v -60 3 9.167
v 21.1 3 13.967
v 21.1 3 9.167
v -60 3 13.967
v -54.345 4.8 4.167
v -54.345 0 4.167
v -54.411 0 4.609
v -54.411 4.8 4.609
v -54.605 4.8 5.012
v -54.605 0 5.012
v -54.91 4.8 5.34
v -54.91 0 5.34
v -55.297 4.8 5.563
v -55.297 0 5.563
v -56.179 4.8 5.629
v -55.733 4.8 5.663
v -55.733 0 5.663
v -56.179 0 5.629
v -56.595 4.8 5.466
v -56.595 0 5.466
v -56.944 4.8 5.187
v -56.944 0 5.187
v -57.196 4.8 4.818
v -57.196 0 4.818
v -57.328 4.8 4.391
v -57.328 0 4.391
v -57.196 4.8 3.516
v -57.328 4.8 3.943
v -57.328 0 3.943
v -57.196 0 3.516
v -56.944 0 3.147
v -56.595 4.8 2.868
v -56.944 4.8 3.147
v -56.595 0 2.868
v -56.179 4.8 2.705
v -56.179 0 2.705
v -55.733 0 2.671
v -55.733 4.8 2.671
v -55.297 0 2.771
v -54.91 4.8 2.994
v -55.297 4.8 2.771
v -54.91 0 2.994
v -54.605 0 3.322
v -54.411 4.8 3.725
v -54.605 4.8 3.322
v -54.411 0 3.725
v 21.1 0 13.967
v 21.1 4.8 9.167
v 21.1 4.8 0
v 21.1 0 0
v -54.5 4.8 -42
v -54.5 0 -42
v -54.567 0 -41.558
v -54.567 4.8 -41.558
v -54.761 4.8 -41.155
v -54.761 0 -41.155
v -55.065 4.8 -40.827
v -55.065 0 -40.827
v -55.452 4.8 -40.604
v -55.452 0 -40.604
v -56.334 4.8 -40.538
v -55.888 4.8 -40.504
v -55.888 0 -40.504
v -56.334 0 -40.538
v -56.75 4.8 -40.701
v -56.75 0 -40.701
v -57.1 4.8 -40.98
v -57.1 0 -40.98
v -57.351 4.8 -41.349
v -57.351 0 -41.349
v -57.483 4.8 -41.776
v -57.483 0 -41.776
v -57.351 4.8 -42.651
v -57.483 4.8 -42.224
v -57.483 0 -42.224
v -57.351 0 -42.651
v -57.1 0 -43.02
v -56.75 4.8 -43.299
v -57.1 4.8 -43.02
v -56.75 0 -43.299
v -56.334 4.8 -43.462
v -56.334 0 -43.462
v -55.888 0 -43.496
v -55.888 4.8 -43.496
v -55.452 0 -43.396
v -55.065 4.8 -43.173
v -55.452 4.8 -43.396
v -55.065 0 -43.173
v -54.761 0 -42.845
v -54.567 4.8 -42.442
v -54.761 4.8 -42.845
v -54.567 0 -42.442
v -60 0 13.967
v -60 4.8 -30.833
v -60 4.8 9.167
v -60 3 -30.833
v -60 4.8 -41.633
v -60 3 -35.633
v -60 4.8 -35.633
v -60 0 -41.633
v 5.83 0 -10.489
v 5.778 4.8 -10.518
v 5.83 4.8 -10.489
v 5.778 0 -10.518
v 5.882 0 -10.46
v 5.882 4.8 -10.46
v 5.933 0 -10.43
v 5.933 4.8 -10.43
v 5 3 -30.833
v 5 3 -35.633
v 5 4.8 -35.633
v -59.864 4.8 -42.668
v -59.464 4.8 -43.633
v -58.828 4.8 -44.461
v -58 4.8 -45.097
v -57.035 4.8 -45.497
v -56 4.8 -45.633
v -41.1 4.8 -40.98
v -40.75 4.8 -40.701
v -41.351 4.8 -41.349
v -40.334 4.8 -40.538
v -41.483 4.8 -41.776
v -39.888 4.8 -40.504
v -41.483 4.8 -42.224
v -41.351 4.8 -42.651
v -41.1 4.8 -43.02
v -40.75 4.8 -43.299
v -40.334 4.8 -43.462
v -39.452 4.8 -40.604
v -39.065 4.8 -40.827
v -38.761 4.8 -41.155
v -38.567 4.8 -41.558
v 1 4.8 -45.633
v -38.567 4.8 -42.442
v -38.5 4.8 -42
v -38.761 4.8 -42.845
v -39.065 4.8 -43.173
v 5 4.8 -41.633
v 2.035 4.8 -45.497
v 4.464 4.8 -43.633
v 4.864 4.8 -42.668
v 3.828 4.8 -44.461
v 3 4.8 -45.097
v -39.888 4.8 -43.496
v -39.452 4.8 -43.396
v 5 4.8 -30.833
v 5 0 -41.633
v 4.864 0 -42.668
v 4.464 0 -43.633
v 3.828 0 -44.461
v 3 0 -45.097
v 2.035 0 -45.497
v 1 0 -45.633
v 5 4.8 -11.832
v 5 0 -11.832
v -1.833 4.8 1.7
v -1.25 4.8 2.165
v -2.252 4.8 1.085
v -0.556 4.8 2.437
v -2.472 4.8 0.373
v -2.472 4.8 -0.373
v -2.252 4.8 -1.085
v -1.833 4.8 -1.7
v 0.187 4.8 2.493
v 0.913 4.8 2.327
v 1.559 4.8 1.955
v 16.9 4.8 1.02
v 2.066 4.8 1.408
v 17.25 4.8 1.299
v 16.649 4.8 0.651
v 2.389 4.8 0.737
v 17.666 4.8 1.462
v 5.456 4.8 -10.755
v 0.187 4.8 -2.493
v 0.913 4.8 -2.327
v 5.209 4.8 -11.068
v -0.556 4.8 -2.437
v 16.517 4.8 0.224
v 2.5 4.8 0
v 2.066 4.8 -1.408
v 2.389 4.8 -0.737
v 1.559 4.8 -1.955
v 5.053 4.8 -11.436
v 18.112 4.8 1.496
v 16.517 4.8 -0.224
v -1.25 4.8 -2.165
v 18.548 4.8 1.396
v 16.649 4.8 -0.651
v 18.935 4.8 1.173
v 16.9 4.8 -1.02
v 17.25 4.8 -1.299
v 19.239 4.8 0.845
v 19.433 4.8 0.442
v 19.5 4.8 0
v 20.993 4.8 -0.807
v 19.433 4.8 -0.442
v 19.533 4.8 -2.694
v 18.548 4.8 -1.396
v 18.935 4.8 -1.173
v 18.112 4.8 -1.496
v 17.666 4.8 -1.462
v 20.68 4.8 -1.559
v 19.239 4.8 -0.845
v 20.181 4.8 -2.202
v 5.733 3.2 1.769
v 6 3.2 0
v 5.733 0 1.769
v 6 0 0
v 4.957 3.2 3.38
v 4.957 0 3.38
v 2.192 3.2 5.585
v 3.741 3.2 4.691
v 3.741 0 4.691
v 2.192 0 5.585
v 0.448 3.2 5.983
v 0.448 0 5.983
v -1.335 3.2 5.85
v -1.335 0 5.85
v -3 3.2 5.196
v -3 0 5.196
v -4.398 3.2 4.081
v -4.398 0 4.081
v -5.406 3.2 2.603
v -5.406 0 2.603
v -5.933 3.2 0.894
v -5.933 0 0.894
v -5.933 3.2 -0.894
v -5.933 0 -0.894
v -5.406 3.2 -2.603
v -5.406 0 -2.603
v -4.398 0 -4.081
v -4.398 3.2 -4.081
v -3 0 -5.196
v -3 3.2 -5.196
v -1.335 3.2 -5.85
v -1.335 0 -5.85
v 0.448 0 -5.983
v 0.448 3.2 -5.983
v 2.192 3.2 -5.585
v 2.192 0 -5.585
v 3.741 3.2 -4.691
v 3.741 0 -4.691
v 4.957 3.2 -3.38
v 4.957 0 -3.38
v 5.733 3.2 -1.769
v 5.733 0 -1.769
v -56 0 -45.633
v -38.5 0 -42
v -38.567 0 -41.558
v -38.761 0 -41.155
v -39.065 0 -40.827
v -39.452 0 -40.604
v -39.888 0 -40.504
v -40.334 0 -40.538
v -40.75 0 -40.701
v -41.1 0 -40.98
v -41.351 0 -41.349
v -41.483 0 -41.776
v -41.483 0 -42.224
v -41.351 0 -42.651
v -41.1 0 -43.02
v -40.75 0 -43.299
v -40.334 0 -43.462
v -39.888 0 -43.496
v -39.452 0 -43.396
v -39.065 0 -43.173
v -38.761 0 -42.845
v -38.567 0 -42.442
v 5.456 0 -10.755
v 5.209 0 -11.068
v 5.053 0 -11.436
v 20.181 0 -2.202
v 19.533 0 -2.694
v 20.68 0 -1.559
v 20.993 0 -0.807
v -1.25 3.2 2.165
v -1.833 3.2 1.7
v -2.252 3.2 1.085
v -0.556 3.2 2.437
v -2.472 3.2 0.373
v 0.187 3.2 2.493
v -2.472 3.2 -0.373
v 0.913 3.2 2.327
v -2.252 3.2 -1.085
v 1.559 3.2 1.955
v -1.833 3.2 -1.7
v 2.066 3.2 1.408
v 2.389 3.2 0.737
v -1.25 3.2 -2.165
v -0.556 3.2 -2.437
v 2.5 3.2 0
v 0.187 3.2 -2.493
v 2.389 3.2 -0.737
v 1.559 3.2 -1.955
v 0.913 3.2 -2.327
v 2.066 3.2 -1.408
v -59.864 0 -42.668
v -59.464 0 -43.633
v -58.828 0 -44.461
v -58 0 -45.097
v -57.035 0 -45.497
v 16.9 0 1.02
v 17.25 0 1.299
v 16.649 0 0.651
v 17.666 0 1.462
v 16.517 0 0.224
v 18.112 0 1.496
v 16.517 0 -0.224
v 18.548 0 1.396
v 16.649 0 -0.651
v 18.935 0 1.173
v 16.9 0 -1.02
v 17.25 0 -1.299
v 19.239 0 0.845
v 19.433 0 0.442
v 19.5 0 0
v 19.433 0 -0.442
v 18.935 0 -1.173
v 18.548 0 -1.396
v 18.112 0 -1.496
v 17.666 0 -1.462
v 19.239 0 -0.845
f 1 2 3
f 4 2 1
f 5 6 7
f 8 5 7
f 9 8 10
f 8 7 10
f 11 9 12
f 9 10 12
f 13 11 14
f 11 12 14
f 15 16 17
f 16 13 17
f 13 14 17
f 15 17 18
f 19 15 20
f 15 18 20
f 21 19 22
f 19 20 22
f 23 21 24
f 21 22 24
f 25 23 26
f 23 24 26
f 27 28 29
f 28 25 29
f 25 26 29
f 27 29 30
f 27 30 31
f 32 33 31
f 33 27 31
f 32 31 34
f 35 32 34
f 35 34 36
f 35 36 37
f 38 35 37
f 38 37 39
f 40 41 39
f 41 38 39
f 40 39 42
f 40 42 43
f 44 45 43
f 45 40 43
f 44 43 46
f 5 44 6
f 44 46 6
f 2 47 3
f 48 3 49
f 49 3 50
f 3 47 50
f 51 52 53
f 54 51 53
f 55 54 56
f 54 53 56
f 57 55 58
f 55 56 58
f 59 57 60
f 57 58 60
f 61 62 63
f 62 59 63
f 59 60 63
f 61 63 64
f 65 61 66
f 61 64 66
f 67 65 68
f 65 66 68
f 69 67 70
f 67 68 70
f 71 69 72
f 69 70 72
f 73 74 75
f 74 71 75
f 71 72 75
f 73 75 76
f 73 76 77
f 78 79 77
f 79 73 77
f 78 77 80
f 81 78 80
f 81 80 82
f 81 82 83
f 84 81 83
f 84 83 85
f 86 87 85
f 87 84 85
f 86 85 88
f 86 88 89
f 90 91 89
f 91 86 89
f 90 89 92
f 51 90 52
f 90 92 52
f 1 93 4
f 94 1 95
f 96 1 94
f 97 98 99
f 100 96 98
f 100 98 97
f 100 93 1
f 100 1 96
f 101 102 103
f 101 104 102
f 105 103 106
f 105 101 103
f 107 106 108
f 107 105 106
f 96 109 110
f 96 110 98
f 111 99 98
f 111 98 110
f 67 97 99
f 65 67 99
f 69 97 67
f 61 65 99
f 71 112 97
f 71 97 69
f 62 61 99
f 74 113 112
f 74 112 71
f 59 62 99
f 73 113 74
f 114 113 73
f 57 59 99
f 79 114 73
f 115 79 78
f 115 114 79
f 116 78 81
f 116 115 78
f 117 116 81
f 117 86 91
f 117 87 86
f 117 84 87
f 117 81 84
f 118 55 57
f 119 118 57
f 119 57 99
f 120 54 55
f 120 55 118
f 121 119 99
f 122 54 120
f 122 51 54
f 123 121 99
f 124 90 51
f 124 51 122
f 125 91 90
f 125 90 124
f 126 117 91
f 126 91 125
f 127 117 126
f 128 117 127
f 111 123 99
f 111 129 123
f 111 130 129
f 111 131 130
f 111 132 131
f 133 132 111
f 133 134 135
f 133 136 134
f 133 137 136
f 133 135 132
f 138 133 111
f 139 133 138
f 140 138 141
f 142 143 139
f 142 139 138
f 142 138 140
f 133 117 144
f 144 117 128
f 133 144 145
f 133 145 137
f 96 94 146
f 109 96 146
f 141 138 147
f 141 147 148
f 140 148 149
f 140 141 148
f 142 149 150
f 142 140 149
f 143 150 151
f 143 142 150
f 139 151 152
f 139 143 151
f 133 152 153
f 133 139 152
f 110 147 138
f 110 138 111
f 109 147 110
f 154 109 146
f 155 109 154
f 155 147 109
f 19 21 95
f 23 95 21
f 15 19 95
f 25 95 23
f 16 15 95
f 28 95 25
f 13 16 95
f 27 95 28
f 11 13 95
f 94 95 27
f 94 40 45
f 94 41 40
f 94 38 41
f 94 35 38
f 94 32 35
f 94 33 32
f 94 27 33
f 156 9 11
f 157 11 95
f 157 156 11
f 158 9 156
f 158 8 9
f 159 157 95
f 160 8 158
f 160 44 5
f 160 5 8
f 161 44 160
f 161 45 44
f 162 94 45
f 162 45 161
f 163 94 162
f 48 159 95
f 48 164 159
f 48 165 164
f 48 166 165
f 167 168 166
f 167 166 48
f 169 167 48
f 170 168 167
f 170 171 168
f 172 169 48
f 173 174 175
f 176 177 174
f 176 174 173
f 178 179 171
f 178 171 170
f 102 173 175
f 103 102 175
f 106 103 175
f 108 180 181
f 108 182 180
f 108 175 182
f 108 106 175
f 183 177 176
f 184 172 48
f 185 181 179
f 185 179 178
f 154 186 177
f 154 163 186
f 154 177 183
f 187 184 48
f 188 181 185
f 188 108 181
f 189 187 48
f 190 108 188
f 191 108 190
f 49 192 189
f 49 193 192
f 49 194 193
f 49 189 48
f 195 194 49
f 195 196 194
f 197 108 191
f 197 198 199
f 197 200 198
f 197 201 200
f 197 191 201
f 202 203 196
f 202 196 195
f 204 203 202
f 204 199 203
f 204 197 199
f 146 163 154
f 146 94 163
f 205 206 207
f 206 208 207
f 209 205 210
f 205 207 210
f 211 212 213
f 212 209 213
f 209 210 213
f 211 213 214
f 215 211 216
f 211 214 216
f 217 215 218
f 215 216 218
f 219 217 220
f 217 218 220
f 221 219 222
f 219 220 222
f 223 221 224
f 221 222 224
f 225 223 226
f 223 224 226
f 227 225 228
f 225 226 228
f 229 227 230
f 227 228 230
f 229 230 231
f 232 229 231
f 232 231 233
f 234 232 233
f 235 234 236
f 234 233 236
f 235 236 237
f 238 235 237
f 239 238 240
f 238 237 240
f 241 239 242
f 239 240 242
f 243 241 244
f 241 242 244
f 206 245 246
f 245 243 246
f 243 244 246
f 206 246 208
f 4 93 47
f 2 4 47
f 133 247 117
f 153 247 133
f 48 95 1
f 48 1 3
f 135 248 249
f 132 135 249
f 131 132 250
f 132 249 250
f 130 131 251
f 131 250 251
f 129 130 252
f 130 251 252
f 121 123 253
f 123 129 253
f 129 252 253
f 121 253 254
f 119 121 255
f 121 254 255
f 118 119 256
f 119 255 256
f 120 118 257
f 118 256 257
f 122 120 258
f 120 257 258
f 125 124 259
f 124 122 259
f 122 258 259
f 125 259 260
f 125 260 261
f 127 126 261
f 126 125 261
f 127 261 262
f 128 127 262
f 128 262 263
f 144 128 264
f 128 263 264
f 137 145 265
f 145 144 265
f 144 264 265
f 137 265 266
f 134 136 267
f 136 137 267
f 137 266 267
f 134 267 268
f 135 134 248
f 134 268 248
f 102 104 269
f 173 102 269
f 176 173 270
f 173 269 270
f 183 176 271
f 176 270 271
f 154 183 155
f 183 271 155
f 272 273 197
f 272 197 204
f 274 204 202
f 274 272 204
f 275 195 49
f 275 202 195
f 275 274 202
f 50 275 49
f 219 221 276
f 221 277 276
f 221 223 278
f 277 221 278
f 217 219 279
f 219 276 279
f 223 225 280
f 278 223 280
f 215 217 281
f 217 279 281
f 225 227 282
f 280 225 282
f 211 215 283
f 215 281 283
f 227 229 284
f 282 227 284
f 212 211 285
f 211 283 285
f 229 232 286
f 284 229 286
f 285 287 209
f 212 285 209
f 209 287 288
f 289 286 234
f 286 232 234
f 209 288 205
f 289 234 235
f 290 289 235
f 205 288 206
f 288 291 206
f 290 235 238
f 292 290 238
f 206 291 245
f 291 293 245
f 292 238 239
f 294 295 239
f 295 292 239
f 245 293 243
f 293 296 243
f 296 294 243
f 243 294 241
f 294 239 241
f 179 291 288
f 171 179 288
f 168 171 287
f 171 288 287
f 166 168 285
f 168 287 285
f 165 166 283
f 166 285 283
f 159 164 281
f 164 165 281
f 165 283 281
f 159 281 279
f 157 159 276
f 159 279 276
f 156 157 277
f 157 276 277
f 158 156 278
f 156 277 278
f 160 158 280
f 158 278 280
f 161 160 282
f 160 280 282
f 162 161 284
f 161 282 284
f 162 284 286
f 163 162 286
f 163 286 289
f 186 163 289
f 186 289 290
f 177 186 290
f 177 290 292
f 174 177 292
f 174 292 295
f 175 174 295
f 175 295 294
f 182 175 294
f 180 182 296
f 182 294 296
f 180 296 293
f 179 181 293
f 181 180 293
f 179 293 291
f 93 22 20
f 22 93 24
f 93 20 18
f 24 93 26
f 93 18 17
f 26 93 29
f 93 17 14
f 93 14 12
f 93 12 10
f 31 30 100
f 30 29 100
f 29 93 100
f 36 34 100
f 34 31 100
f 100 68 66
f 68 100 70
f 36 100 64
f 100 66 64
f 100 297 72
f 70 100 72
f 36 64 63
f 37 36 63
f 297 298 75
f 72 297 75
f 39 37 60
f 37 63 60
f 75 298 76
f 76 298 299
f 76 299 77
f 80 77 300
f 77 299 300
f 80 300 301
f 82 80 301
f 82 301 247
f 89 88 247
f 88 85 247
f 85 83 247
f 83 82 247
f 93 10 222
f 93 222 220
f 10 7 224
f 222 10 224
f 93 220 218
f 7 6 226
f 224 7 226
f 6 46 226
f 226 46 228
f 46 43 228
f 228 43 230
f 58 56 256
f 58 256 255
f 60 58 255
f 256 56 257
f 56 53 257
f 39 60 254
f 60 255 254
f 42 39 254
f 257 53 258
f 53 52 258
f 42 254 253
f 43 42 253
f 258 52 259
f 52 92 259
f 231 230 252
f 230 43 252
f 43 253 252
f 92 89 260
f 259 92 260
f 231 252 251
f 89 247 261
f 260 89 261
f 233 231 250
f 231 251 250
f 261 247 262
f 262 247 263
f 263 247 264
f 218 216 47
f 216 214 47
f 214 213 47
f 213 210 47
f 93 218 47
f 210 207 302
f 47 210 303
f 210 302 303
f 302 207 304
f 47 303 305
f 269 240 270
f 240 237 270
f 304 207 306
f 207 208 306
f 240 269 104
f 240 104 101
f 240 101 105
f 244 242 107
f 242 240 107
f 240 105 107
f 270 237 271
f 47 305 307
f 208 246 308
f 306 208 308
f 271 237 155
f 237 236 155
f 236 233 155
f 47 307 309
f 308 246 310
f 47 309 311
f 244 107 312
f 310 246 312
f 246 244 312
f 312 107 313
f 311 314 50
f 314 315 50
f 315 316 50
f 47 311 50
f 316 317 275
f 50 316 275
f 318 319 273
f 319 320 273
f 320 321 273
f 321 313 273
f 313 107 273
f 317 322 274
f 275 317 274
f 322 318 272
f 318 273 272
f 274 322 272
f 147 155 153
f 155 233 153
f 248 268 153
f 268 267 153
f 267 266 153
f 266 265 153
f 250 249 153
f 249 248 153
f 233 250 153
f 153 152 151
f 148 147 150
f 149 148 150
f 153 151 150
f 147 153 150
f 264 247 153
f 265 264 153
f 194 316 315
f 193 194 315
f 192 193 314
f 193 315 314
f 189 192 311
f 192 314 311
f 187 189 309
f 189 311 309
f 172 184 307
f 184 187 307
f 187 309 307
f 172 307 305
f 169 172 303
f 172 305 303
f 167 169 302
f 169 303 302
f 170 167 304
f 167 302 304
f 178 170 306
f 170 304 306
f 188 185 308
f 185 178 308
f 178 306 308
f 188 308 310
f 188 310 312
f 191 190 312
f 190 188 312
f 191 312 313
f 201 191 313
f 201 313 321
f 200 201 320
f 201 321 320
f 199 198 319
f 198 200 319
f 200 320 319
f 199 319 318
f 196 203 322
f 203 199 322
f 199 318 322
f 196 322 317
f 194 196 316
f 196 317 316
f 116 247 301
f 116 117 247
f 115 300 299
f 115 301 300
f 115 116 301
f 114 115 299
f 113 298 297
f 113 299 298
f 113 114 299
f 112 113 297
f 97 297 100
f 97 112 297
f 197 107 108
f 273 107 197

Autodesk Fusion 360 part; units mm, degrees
sketch "Sketch1" plane through (0, 0, 0) normal (0, 1, 0) x (1, 0, 0)
  circle A0 centre (0, 0) radius 48 construction
  circle A1 centre (0, 0) radius 14 construction
  circle A2 centre (0, 0) radius 9.5 construction
  circle A3 centre (0, 0) radius 8 construction
  line L0 (0, 0) -> (8, 0) construction
  line L1 (0, 0) -> (0, -9.5) construction
  line L2 (0, 0) -> (-8, 0) construction
  line L3 (0, 0) -> (0, 9.5) construction
  circle A4 centre (8, 0) radius 1.5 construction
  circle A5 centre (-8, 0) radius 1.5 construction
  circle A6 centre (0, 9.5) radius 1.5 construction
  circle A7 centre (0, 0) radius 12 construction
  line L4 (8, 0) -> (18, 0) construction
  line L5 (21.1, 0) -> (19.55, 2.6847) construction
  line L6 (19.55, 2.6847) -> (16.45, 2.6847) construction
  line L7 (16.45, 2.6847) -> (14.9, 0) construction
  line L8 (14.9, 0) -> (16.45, -2.6847) construction
  line L9 (16.45, -2.6847) -> (19.55, -2.6847) construction
  line L10 (19.55, -2.6847) -> (21.1, 0) construction
  circle A8 centre (18, 0) radius 3.1 construction
  circle A9 centre (18, 0) radius 1.5
  line L11 (0, 52) -> (-68, 52) construction
  line L12 (-9.7468, 47) -> (-68, 47) construction
  line L13 (-68, 52) -> (-68, 47) construction
  line L14 (-68, 47) -> (-68, 35.633) construction
  line L15 (-68, 35.633) -> (-32.1604, 35.633) construction
  line L16 (-68, 35.633) -> (-68, 30.833) construction
  line L17 (-68, 30.833) -> (-36.7876, 30.833) construction
  line L18 (-68, 30.833) -> (-68, -9.167) construction
  line L19 (-60, -9.167) -> (-47.1165, -9.167)
  line L20 (-68, -9.167) -> (-68, -13.967) construction
  line L21 (-68, -13.967) -> (-45.923, -13.967) construction
  line L22 (-60, -13.967) -> (-60, 35.633)
  line L23 (5.9333, 10.4305) -> (19.5328, 2.6945)
  line L24 (-60, -13.967) -> (21.1, -13.967)
  line L25 (21.1, -13.967) -> (21.1, 0)
  arc A10 (21.1, 0) -> (19.5328, 2.6945) centre (18, 0) ccw
  line L26 (-60, 35.633) -> (5, 35.633)
  line L27 (5, 35.633) -> (5, 11.8322)
  arc A11 (5.9333, 10.4305) -> (5.7778, 10.5175) centre (0, 0) ccw
  arc A12 (5, 11.8322) -> (5.7778, 10.5175) centre (6.5, 11.8322) ccw
  arc A13 (5.7778, 10.5175) -> (7.9656, 11.513) centre (6.5, 11.8322) ccw construction
  arc A14 (5.4445, 12.898) -> (5, 11.8322) centre (6.5, 11.8322) ccw construction
  arc A15 (7.9656, 11.513) -> (5.4445, 12.898) centre (6.5, 11.8322) ccw construction
  line L28 (5, 11.8322) -> (5, 10.9087) construction
  arc A16 (5.7778, 10.5175) -> (5, 10.9087) centre (0, 0) ccw construction
  line L29 (-60, 30.833) -> (5, 30.833)
  line L30 (-47.1165, -9.167) -> (21.1, -9.167)
  line L31 (-60, 35.633) -> (-60, 45.633)
  line L32 (-60, 45.633) -> (5, 45.633)
  line L33 (5, 45.633) -> (5, 35.633)
  circle A17 centre (-56, 42) radius 1.5
  circle A18 centre (-40, 42) radius 1.5
  line L34 (-40, 42) -> (0, 0) construction
  circle A19 centre (-55.8448, -4.167) radius 1.5
  line L35 (0, 0) -> (-55.8448, -4.167) construction
  line L36 (-68, -9.167) -> (-60, -9.167) construction
  circle A20 centre (0, 0) radius 2.5
  circle A21 centre (0, 0) radius 6
  point P0 (18, 0)
  point P1 (-33.1034, 34.7586)
  point P2 (-47.8669, -3.5717)
  dimension "d1" = 96
  dimension "d2" = 28
  dimension "d3" = 19
  dimension "d4" = 16
  dimension "d5" = 3
  dimension "d6" = 3
  dimension "d7" = 3
  dimension "d8" = 24
  dimension "d9" = 18
  dimension "d10" = 3.1
  dimension "d11" = 60
  dimension "d12" = 3
  dimension "d13" = 52
  dimension "d14" = 68
  dimension "d15" = 68
  dimension "d18" = 5
  dimension "d22" = 16.367
  dimension "d23" = 4.8
  dimension "d24" = 40
  dimension "d25" = 4.8
  dimension "d26" = 8
  dimension "d27" = 3.1
  dimension "d28" = 5
  dimension "d33" = 12
  dimension "d34" = 3
  dimension "d35" = 10
  dimension "d36" = 3
  dimension "d37" = 12
  dimension "d38" = 5
  dimension "d39" = 3
  dimension "d40" = 5
  dimension "d41" = 10
  dimension "d42" = 3
  dimension "d43" = 5
  dimension "d44" = 8
  dimension "d51" = 5
  dimension "d52" = 12
extrude "Extrude1" add sketch "Sketch1" along normal blind 4.8 contours L19 L22 L23 L25 A10 L27 A11 A12 L29 L30 | L19 L22 L24 L25 L30 | L22 L26 L27 L29 | L26 L31 L32 L33 | A21
fillet "Fillet1" radius 4 2 edges at (5, 2.4, -45.633) (-60, 2.4, -45.633)
extrude "Extrude3" cut sketch "Sketch1" along normal blind 3.2 contours A21
sketch "Sketch2" plane through (0, 4.8, 0) normal (0, 1, 0) x (-1, 0, 0)
  arc A0 (56, -45.633) -> (60, -41.633) centre (56, -41.633) ccw
  line L0 (60, -41.633) -> (60, 13.967)
  line L1 (60, 13.967) -> (-21.1, 13.967)
  line L2 (-21.1, 13.967) -> (-21.1, 0)
  arc A1 (-21.1, 0) -> (-19.5328, -2.6945) centre (-18, 0) ccw
  line L3 (-19.5328, -2.6945) -> (-5.9333, -10.4305)
  arc A2 (-5.9333, -10.4305) -> (-5.7778, -10.5175) centre (0, 0) ccw
  arc A3 (-5, -11.8322) -> (-5.7778, -10.5175) centre (-6.5, -11.8322) ccw
  line L4 (-5, -11.8322) -> (-5, -41.633)
  arc A4 (-5, -41.633) -> (-1, -45.633) centre (-1, -41.633) ccw
  line L5 (-1, -45.633) -> (56, -45.633)
  circle A5 centre (0, 0) radius 2.5
  circle A6 centre (55.8448, 4.167) radius 1.5
  circle A7 centre (40, -42) radius 1.5
  circle A8 centre (56, -42) radius 1.5
  circle A9 centre (-18, 0) radius 1.5
  line L6 (47.1165, 9.167) -> (-21.1, 9.167)
  line L7 (60, 9.167) -> (47.1165, 9.167)
  line L8 (60, -30.833) -> (-5, -30.833)
  line L9 (60, -35.633) -> (-5, -35.633)
  line L10 (-21.1, 13.967) -> (60, 13.967)
  line L11 (60, 13.967) -> (60, 9.167)
  line L12 (60, 9.167) -> (-21.1, 9.167)
  line L13 (-21.1, 9.167) -> (-21.1, 13.967)
  line L14 (-5, -30.833) -> (60, -30.833)
  line L15 (60, -30.833) -> (60, -35.633)
  line L16 (60, -35.633) -> (-5, -35.633)
  line L17 (-5, -35.633) -> (-5, -30.833)
extrude "Extrude4" cut sketch "Sketch2" against normal blind 1.8 contours L0 L4 L8 L9 L14 L15 L16 L17 | L0 L1 L2 L6 L7 L10 L11 L12 L13
